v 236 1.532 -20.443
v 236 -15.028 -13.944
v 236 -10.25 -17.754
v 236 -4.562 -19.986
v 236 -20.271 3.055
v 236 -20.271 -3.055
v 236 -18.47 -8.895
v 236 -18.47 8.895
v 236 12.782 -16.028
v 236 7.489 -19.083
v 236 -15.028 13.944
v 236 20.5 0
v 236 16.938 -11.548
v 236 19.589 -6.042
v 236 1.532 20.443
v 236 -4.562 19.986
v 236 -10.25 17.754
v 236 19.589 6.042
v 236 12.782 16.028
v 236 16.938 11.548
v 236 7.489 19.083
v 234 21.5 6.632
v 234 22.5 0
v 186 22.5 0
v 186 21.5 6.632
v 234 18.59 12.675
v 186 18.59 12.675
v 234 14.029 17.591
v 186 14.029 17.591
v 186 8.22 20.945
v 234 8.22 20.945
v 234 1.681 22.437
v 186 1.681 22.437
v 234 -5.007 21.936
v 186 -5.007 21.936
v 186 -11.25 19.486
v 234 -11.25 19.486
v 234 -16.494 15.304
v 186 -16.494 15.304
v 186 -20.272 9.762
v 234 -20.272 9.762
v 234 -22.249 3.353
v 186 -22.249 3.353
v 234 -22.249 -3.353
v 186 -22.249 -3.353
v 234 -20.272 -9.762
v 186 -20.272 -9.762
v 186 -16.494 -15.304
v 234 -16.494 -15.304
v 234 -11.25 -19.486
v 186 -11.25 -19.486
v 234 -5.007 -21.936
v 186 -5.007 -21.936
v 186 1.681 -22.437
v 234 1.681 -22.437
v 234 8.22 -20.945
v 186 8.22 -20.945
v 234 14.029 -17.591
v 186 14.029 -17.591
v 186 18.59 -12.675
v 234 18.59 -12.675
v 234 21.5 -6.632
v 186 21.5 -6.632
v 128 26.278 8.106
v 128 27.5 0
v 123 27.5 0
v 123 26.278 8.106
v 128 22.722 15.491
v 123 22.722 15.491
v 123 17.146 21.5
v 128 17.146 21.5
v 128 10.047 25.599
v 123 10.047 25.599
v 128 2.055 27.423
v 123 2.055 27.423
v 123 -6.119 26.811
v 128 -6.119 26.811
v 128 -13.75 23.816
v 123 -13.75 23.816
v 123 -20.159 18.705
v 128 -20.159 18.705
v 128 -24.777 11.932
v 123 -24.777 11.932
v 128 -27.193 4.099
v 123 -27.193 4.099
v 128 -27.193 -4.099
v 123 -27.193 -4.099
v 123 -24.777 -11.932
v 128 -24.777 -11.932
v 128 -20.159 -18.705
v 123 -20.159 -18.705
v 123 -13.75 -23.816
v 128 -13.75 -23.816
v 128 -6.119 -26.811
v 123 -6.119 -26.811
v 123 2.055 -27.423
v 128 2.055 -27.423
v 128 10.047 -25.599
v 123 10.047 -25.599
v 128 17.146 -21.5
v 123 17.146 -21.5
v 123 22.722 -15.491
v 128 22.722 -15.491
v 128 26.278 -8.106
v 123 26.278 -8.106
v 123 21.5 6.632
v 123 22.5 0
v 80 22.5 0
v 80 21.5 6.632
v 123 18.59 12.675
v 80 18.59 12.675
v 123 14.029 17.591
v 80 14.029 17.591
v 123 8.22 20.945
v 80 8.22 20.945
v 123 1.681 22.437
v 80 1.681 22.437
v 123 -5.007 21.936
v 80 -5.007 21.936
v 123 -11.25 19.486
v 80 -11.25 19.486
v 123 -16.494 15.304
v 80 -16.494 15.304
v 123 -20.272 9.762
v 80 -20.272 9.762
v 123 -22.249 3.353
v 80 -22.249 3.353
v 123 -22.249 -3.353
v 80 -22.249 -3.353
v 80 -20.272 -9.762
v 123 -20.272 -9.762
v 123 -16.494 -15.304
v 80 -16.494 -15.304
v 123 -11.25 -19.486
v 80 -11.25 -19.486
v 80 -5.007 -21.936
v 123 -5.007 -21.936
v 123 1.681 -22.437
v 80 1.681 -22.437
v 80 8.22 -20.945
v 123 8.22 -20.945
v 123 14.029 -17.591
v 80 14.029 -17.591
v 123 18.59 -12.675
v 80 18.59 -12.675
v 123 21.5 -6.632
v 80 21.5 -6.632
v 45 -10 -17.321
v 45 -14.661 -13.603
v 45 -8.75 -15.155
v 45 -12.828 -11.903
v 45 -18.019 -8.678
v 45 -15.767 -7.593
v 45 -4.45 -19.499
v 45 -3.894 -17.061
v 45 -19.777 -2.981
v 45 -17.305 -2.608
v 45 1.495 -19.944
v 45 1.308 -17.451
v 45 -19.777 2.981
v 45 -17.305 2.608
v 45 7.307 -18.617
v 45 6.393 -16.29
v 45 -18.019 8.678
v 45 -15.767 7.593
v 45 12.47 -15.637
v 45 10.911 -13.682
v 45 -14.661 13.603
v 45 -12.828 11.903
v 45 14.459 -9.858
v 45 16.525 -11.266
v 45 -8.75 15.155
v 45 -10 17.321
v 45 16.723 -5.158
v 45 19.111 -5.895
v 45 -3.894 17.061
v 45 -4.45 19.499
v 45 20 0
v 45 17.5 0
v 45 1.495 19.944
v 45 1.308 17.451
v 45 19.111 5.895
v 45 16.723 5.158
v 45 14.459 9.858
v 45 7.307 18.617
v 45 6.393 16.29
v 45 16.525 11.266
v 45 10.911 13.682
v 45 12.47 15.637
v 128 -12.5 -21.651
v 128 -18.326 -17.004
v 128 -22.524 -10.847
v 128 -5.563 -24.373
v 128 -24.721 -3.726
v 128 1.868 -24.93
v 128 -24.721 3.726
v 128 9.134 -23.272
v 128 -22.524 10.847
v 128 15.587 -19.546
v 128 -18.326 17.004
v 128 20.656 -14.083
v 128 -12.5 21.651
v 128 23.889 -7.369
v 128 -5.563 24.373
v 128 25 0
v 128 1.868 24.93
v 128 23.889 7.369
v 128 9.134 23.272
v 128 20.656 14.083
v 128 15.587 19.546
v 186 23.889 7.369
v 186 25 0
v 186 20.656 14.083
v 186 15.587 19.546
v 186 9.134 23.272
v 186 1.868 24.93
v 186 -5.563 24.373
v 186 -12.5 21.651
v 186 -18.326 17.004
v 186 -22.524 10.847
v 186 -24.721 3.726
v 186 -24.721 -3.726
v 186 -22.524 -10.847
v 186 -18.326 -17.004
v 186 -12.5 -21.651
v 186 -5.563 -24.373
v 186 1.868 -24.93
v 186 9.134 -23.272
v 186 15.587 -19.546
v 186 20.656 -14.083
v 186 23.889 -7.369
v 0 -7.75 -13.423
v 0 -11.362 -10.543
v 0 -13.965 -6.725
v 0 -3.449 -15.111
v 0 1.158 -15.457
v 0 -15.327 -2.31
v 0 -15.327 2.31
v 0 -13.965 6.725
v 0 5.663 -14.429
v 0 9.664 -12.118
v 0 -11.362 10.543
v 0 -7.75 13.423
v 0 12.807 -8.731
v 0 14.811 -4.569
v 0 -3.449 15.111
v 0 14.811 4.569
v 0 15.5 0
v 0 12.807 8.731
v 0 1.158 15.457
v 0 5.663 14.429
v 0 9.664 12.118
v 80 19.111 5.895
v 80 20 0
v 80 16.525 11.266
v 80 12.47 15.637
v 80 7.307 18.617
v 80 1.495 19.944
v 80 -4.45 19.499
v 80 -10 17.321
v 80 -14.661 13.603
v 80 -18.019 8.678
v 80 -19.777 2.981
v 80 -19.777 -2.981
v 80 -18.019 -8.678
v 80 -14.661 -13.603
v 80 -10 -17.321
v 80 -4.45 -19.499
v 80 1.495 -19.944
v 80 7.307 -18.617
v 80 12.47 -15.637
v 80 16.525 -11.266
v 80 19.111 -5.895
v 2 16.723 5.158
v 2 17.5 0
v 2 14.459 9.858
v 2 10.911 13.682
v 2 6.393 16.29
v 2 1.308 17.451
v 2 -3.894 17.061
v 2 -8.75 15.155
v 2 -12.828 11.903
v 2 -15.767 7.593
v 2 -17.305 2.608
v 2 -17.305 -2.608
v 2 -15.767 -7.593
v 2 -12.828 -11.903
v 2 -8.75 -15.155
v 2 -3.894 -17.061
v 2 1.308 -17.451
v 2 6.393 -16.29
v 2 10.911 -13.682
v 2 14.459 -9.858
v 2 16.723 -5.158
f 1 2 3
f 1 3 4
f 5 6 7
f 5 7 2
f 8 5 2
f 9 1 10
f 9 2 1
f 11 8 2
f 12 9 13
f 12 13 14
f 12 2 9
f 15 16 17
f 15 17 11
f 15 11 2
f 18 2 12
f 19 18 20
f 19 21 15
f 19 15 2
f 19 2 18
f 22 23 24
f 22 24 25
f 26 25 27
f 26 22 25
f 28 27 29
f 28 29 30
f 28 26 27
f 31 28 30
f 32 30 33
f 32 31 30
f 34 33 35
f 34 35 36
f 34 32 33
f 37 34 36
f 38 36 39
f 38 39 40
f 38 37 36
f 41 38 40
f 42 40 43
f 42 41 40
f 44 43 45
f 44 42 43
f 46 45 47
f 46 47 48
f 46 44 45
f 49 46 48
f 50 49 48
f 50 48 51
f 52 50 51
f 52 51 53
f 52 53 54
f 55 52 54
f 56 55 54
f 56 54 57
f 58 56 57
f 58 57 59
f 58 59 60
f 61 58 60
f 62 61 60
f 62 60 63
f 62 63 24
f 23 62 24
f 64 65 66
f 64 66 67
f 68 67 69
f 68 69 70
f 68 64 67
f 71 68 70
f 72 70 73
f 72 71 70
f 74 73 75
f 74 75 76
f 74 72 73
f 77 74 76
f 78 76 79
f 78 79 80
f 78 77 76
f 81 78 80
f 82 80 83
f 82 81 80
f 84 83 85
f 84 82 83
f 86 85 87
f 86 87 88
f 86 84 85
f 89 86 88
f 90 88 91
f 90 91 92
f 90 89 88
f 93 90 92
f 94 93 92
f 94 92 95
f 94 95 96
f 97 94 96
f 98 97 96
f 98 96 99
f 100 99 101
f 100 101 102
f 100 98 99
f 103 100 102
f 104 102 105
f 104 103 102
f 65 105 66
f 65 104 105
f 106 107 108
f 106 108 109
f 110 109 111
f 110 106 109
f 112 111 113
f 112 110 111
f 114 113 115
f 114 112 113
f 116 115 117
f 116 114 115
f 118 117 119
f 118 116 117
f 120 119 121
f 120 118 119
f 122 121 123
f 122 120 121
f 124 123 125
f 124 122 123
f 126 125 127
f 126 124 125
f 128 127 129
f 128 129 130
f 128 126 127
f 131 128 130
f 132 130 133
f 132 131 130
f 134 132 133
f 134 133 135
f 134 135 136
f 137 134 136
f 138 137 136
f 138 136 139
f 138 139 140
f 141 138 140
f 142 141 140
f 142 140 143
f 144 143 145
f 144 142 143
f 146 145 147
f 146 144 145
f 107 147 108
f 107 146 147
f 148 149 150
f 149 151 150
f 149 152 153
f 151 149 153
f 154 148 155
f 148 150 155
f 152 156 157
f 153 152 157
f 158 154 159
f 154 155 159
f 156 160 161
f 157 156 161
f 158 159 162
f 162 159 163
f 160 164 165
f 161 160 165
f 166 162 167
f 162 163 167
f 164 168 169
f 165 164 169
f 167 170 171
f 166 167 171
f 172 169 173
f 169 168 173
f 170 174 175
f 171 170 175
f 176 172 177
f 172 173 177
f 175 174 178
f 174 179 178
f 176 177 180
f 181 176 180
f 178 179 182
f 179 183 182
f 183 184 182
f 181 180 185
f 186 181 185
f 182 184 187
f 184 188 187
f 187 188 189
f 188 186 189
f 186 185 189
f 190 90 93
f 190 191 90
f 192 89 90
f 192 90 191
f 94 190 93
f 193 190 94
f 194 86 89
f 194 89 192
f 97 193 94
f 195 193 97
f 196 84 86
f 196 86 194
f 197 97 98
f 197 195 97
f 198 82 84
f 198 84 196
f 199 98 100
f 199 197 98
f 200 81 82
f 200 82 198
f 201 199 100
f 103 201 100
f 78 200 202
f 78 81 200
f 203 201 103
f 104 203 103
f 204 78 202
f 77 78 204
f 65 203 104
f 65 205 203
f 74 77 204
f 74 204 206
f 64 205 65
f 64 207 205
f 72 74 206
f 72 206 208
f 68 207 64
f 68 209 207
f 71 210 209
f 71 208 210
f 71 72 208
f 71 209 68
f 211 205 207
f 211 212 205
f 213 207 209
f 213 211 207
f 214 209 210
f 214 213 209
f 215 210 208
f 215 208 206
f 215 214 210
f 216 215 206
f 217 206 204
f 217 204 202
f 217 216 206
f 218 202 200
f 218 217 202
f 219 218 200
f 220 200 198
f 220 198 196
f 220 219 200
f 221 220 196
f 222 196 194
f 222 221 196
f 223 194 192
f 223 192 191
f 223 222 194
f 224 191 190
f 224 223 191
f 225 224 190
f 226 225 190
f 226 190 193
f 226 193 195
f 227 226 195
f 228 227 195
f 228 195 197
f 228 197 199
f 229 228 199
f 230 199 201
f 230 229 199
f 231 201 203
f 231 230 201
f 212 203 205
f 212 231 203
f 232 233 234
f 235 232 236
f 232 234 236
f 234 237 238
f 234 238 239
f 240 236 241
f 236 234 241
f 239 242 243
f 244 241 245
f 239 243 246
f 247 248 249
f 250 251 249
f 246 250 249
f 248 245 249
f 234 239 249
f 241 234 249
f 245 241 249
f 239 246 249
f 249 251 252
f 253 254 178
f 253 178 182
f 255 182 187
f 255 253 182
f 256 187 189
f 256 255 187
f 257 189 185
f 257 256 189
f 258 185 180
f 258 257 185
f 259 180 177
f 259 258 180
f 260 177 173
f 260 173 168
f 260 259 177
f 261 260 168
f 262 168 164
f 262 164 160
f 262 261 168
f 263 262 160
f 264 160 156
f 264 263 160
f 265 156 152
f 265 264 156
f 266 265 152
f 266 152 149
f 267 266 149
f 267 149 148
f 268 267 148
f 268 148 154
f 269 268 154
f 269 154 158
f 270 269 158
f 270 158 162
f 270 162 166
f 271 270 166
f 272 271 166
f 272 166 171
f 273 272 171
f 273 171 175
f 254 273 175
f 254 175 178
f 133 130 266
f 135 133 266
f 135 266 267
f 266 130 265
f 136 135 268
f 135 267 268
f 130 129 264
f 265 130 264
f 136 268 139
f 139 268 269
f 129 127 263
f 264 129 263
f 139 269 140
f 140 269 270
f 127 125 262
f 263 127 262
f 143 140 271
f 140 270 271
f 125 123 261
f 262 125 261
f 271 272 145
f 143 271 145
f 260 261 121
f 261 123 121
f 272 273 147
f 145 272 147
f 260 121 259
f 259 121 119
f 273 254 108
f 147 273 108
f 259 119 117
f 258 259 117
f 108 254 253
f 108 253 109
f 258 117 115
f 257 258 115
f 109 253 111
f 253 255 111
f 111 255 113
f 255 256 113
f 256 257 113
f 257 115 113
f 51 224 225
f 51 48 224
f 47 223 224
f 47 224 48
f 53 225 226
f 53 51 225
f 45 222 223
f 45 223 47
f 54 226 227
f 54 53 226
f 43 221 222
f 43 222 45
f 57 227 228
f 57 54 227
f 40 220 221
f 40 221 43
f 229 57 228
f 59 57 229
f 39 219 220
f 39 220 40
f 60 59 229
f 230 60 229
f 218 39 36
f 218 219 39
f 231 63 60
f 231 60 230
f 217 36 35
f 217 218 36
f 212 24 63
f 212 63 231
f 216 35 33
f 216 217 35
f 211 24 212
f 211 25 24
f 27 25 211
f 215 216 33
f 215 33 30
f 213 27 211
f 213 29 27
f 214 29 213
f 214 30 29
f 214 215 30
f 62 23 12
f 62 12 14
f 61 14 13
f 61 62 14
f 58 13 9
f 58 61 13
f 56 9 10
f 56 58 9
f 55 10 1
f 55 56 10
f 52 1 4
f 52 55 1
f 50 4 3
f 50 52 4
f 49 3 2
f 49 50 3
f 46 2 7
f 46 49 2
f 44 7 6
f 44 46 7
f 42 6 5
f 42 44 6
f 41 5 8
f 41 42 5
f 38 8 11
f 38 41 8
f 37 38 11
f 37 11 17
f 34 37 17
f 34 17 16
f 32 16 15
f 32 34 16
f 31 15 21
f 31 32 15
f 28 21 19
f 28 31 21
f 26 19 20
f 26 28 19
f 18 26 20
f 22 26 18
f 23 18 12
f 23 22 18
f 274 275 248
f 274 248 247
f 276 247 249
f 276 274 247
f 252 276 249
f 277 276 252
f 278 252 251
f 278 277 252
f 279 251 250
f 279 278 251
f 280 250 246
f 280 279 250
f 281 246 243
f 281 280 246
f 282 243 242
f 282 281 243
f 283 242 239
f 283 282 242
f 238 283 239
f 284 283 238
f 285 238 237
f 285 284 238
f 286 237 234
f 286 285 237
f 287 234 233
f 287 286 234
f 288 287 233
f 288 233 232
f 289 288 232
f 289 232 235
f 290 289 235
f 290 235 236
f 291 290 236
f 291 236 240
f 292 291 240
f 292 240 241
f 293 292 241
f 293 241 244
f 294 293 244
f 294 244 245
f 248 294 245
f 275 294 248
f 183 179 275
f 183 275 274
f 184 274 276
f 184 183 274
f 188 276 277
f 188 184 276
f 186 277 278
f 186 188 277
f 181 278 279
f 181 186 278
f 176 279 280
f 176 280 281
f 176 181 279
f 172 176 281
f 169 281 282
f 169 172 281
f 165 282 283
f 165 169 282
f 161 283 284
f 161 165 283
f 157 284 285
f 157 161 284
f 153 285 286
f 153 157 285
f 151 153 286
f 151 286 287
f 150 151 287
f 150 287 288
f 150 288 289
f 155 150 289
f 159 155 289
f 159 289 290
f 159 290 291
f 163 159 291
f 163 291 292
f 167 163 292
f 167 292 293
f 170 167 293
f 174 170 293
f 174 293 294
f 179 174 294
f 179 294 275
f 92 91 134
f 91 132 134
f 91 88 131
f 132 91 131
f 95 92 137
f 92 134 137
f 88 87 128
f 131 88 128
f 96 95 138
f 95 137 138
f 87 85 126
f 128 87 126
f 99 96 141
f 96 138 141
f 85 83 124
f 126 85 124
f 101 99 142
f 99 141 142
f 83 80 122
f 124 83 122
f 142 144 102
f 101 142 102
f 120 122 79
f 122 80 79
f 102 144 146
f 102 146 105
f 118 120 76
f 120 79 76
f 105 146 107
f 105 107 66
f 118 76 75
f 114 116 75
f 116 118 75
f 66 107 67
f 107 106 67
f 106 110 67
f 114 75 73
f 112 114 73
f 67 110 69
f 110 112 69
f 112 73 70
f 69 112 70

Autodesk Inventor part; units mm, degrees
ref_plane "Start Plane" through (0, 0, 0) normal (1, 0, 0) x (0, 1, 0)
ref_plane "XZ Plane" through (0, 0, 0) normal (0, 1, 0) x (-1, 0, 0)
ref_plane "XY Plane" through (0, 0, 0) normal (0, 0, 1) x (1, 0, 0)
sketch "Main Sketch" plane through (0, 0, 0) normal (0, 0, 1) x (1, 0, 0)
  line L0 (0, 0) -> (236, 0)
  line L1 (0, 0) -> (0, 17.5)
  line L2 (0, 17.5) -> (45, 17.5)
  line L3 (45, 17.5) -> (45, 20)
  line L4 (45, 20) -> (80, 20)
  line L5 (80, 20) -> (80, 22.5)
  line L6 (80, 22.5) -> (123, 22.5)
  line L7 (123, 22.5) -> (123, 27.5)
  line L8 (128, 27.5) -> (128, 25)
  line L9 (123, 27.5) -> (128, 27.5)
  line L10 (186, 25) -> (186, 22.5)
  line L11 (128, 25) -> (186, 25)
  line L12 (236, 22.5) -> (236, 0)
  line L13 (186, 22.5) -> (236, 22.5)
  dimension "d3" = 35
  dimension "d4" = 40
  dimension "d5" = 45
  dimension "d6" = 55
  dimension "d7" = 50
  dimension "d8" = 45
revolve "Revolution1" add sketch "Main Sketch" angle 360 about axis through (0, 0, 0) along (1, 0, 0)
chamfer "Chamfer1" distance 2 angle 45 1 edges at (0, -17.5, 0) measured on face at (30, 17.2734, -2.8072)
chamfer "Chamfer2" distance 2 angle 45 1 edges at (236, -22.5, 0) measured on face at (219.3333, 22.2086, -3.6093)
equation "\"Length\" = 236"
properties part number "Shaft" material "Steel"
